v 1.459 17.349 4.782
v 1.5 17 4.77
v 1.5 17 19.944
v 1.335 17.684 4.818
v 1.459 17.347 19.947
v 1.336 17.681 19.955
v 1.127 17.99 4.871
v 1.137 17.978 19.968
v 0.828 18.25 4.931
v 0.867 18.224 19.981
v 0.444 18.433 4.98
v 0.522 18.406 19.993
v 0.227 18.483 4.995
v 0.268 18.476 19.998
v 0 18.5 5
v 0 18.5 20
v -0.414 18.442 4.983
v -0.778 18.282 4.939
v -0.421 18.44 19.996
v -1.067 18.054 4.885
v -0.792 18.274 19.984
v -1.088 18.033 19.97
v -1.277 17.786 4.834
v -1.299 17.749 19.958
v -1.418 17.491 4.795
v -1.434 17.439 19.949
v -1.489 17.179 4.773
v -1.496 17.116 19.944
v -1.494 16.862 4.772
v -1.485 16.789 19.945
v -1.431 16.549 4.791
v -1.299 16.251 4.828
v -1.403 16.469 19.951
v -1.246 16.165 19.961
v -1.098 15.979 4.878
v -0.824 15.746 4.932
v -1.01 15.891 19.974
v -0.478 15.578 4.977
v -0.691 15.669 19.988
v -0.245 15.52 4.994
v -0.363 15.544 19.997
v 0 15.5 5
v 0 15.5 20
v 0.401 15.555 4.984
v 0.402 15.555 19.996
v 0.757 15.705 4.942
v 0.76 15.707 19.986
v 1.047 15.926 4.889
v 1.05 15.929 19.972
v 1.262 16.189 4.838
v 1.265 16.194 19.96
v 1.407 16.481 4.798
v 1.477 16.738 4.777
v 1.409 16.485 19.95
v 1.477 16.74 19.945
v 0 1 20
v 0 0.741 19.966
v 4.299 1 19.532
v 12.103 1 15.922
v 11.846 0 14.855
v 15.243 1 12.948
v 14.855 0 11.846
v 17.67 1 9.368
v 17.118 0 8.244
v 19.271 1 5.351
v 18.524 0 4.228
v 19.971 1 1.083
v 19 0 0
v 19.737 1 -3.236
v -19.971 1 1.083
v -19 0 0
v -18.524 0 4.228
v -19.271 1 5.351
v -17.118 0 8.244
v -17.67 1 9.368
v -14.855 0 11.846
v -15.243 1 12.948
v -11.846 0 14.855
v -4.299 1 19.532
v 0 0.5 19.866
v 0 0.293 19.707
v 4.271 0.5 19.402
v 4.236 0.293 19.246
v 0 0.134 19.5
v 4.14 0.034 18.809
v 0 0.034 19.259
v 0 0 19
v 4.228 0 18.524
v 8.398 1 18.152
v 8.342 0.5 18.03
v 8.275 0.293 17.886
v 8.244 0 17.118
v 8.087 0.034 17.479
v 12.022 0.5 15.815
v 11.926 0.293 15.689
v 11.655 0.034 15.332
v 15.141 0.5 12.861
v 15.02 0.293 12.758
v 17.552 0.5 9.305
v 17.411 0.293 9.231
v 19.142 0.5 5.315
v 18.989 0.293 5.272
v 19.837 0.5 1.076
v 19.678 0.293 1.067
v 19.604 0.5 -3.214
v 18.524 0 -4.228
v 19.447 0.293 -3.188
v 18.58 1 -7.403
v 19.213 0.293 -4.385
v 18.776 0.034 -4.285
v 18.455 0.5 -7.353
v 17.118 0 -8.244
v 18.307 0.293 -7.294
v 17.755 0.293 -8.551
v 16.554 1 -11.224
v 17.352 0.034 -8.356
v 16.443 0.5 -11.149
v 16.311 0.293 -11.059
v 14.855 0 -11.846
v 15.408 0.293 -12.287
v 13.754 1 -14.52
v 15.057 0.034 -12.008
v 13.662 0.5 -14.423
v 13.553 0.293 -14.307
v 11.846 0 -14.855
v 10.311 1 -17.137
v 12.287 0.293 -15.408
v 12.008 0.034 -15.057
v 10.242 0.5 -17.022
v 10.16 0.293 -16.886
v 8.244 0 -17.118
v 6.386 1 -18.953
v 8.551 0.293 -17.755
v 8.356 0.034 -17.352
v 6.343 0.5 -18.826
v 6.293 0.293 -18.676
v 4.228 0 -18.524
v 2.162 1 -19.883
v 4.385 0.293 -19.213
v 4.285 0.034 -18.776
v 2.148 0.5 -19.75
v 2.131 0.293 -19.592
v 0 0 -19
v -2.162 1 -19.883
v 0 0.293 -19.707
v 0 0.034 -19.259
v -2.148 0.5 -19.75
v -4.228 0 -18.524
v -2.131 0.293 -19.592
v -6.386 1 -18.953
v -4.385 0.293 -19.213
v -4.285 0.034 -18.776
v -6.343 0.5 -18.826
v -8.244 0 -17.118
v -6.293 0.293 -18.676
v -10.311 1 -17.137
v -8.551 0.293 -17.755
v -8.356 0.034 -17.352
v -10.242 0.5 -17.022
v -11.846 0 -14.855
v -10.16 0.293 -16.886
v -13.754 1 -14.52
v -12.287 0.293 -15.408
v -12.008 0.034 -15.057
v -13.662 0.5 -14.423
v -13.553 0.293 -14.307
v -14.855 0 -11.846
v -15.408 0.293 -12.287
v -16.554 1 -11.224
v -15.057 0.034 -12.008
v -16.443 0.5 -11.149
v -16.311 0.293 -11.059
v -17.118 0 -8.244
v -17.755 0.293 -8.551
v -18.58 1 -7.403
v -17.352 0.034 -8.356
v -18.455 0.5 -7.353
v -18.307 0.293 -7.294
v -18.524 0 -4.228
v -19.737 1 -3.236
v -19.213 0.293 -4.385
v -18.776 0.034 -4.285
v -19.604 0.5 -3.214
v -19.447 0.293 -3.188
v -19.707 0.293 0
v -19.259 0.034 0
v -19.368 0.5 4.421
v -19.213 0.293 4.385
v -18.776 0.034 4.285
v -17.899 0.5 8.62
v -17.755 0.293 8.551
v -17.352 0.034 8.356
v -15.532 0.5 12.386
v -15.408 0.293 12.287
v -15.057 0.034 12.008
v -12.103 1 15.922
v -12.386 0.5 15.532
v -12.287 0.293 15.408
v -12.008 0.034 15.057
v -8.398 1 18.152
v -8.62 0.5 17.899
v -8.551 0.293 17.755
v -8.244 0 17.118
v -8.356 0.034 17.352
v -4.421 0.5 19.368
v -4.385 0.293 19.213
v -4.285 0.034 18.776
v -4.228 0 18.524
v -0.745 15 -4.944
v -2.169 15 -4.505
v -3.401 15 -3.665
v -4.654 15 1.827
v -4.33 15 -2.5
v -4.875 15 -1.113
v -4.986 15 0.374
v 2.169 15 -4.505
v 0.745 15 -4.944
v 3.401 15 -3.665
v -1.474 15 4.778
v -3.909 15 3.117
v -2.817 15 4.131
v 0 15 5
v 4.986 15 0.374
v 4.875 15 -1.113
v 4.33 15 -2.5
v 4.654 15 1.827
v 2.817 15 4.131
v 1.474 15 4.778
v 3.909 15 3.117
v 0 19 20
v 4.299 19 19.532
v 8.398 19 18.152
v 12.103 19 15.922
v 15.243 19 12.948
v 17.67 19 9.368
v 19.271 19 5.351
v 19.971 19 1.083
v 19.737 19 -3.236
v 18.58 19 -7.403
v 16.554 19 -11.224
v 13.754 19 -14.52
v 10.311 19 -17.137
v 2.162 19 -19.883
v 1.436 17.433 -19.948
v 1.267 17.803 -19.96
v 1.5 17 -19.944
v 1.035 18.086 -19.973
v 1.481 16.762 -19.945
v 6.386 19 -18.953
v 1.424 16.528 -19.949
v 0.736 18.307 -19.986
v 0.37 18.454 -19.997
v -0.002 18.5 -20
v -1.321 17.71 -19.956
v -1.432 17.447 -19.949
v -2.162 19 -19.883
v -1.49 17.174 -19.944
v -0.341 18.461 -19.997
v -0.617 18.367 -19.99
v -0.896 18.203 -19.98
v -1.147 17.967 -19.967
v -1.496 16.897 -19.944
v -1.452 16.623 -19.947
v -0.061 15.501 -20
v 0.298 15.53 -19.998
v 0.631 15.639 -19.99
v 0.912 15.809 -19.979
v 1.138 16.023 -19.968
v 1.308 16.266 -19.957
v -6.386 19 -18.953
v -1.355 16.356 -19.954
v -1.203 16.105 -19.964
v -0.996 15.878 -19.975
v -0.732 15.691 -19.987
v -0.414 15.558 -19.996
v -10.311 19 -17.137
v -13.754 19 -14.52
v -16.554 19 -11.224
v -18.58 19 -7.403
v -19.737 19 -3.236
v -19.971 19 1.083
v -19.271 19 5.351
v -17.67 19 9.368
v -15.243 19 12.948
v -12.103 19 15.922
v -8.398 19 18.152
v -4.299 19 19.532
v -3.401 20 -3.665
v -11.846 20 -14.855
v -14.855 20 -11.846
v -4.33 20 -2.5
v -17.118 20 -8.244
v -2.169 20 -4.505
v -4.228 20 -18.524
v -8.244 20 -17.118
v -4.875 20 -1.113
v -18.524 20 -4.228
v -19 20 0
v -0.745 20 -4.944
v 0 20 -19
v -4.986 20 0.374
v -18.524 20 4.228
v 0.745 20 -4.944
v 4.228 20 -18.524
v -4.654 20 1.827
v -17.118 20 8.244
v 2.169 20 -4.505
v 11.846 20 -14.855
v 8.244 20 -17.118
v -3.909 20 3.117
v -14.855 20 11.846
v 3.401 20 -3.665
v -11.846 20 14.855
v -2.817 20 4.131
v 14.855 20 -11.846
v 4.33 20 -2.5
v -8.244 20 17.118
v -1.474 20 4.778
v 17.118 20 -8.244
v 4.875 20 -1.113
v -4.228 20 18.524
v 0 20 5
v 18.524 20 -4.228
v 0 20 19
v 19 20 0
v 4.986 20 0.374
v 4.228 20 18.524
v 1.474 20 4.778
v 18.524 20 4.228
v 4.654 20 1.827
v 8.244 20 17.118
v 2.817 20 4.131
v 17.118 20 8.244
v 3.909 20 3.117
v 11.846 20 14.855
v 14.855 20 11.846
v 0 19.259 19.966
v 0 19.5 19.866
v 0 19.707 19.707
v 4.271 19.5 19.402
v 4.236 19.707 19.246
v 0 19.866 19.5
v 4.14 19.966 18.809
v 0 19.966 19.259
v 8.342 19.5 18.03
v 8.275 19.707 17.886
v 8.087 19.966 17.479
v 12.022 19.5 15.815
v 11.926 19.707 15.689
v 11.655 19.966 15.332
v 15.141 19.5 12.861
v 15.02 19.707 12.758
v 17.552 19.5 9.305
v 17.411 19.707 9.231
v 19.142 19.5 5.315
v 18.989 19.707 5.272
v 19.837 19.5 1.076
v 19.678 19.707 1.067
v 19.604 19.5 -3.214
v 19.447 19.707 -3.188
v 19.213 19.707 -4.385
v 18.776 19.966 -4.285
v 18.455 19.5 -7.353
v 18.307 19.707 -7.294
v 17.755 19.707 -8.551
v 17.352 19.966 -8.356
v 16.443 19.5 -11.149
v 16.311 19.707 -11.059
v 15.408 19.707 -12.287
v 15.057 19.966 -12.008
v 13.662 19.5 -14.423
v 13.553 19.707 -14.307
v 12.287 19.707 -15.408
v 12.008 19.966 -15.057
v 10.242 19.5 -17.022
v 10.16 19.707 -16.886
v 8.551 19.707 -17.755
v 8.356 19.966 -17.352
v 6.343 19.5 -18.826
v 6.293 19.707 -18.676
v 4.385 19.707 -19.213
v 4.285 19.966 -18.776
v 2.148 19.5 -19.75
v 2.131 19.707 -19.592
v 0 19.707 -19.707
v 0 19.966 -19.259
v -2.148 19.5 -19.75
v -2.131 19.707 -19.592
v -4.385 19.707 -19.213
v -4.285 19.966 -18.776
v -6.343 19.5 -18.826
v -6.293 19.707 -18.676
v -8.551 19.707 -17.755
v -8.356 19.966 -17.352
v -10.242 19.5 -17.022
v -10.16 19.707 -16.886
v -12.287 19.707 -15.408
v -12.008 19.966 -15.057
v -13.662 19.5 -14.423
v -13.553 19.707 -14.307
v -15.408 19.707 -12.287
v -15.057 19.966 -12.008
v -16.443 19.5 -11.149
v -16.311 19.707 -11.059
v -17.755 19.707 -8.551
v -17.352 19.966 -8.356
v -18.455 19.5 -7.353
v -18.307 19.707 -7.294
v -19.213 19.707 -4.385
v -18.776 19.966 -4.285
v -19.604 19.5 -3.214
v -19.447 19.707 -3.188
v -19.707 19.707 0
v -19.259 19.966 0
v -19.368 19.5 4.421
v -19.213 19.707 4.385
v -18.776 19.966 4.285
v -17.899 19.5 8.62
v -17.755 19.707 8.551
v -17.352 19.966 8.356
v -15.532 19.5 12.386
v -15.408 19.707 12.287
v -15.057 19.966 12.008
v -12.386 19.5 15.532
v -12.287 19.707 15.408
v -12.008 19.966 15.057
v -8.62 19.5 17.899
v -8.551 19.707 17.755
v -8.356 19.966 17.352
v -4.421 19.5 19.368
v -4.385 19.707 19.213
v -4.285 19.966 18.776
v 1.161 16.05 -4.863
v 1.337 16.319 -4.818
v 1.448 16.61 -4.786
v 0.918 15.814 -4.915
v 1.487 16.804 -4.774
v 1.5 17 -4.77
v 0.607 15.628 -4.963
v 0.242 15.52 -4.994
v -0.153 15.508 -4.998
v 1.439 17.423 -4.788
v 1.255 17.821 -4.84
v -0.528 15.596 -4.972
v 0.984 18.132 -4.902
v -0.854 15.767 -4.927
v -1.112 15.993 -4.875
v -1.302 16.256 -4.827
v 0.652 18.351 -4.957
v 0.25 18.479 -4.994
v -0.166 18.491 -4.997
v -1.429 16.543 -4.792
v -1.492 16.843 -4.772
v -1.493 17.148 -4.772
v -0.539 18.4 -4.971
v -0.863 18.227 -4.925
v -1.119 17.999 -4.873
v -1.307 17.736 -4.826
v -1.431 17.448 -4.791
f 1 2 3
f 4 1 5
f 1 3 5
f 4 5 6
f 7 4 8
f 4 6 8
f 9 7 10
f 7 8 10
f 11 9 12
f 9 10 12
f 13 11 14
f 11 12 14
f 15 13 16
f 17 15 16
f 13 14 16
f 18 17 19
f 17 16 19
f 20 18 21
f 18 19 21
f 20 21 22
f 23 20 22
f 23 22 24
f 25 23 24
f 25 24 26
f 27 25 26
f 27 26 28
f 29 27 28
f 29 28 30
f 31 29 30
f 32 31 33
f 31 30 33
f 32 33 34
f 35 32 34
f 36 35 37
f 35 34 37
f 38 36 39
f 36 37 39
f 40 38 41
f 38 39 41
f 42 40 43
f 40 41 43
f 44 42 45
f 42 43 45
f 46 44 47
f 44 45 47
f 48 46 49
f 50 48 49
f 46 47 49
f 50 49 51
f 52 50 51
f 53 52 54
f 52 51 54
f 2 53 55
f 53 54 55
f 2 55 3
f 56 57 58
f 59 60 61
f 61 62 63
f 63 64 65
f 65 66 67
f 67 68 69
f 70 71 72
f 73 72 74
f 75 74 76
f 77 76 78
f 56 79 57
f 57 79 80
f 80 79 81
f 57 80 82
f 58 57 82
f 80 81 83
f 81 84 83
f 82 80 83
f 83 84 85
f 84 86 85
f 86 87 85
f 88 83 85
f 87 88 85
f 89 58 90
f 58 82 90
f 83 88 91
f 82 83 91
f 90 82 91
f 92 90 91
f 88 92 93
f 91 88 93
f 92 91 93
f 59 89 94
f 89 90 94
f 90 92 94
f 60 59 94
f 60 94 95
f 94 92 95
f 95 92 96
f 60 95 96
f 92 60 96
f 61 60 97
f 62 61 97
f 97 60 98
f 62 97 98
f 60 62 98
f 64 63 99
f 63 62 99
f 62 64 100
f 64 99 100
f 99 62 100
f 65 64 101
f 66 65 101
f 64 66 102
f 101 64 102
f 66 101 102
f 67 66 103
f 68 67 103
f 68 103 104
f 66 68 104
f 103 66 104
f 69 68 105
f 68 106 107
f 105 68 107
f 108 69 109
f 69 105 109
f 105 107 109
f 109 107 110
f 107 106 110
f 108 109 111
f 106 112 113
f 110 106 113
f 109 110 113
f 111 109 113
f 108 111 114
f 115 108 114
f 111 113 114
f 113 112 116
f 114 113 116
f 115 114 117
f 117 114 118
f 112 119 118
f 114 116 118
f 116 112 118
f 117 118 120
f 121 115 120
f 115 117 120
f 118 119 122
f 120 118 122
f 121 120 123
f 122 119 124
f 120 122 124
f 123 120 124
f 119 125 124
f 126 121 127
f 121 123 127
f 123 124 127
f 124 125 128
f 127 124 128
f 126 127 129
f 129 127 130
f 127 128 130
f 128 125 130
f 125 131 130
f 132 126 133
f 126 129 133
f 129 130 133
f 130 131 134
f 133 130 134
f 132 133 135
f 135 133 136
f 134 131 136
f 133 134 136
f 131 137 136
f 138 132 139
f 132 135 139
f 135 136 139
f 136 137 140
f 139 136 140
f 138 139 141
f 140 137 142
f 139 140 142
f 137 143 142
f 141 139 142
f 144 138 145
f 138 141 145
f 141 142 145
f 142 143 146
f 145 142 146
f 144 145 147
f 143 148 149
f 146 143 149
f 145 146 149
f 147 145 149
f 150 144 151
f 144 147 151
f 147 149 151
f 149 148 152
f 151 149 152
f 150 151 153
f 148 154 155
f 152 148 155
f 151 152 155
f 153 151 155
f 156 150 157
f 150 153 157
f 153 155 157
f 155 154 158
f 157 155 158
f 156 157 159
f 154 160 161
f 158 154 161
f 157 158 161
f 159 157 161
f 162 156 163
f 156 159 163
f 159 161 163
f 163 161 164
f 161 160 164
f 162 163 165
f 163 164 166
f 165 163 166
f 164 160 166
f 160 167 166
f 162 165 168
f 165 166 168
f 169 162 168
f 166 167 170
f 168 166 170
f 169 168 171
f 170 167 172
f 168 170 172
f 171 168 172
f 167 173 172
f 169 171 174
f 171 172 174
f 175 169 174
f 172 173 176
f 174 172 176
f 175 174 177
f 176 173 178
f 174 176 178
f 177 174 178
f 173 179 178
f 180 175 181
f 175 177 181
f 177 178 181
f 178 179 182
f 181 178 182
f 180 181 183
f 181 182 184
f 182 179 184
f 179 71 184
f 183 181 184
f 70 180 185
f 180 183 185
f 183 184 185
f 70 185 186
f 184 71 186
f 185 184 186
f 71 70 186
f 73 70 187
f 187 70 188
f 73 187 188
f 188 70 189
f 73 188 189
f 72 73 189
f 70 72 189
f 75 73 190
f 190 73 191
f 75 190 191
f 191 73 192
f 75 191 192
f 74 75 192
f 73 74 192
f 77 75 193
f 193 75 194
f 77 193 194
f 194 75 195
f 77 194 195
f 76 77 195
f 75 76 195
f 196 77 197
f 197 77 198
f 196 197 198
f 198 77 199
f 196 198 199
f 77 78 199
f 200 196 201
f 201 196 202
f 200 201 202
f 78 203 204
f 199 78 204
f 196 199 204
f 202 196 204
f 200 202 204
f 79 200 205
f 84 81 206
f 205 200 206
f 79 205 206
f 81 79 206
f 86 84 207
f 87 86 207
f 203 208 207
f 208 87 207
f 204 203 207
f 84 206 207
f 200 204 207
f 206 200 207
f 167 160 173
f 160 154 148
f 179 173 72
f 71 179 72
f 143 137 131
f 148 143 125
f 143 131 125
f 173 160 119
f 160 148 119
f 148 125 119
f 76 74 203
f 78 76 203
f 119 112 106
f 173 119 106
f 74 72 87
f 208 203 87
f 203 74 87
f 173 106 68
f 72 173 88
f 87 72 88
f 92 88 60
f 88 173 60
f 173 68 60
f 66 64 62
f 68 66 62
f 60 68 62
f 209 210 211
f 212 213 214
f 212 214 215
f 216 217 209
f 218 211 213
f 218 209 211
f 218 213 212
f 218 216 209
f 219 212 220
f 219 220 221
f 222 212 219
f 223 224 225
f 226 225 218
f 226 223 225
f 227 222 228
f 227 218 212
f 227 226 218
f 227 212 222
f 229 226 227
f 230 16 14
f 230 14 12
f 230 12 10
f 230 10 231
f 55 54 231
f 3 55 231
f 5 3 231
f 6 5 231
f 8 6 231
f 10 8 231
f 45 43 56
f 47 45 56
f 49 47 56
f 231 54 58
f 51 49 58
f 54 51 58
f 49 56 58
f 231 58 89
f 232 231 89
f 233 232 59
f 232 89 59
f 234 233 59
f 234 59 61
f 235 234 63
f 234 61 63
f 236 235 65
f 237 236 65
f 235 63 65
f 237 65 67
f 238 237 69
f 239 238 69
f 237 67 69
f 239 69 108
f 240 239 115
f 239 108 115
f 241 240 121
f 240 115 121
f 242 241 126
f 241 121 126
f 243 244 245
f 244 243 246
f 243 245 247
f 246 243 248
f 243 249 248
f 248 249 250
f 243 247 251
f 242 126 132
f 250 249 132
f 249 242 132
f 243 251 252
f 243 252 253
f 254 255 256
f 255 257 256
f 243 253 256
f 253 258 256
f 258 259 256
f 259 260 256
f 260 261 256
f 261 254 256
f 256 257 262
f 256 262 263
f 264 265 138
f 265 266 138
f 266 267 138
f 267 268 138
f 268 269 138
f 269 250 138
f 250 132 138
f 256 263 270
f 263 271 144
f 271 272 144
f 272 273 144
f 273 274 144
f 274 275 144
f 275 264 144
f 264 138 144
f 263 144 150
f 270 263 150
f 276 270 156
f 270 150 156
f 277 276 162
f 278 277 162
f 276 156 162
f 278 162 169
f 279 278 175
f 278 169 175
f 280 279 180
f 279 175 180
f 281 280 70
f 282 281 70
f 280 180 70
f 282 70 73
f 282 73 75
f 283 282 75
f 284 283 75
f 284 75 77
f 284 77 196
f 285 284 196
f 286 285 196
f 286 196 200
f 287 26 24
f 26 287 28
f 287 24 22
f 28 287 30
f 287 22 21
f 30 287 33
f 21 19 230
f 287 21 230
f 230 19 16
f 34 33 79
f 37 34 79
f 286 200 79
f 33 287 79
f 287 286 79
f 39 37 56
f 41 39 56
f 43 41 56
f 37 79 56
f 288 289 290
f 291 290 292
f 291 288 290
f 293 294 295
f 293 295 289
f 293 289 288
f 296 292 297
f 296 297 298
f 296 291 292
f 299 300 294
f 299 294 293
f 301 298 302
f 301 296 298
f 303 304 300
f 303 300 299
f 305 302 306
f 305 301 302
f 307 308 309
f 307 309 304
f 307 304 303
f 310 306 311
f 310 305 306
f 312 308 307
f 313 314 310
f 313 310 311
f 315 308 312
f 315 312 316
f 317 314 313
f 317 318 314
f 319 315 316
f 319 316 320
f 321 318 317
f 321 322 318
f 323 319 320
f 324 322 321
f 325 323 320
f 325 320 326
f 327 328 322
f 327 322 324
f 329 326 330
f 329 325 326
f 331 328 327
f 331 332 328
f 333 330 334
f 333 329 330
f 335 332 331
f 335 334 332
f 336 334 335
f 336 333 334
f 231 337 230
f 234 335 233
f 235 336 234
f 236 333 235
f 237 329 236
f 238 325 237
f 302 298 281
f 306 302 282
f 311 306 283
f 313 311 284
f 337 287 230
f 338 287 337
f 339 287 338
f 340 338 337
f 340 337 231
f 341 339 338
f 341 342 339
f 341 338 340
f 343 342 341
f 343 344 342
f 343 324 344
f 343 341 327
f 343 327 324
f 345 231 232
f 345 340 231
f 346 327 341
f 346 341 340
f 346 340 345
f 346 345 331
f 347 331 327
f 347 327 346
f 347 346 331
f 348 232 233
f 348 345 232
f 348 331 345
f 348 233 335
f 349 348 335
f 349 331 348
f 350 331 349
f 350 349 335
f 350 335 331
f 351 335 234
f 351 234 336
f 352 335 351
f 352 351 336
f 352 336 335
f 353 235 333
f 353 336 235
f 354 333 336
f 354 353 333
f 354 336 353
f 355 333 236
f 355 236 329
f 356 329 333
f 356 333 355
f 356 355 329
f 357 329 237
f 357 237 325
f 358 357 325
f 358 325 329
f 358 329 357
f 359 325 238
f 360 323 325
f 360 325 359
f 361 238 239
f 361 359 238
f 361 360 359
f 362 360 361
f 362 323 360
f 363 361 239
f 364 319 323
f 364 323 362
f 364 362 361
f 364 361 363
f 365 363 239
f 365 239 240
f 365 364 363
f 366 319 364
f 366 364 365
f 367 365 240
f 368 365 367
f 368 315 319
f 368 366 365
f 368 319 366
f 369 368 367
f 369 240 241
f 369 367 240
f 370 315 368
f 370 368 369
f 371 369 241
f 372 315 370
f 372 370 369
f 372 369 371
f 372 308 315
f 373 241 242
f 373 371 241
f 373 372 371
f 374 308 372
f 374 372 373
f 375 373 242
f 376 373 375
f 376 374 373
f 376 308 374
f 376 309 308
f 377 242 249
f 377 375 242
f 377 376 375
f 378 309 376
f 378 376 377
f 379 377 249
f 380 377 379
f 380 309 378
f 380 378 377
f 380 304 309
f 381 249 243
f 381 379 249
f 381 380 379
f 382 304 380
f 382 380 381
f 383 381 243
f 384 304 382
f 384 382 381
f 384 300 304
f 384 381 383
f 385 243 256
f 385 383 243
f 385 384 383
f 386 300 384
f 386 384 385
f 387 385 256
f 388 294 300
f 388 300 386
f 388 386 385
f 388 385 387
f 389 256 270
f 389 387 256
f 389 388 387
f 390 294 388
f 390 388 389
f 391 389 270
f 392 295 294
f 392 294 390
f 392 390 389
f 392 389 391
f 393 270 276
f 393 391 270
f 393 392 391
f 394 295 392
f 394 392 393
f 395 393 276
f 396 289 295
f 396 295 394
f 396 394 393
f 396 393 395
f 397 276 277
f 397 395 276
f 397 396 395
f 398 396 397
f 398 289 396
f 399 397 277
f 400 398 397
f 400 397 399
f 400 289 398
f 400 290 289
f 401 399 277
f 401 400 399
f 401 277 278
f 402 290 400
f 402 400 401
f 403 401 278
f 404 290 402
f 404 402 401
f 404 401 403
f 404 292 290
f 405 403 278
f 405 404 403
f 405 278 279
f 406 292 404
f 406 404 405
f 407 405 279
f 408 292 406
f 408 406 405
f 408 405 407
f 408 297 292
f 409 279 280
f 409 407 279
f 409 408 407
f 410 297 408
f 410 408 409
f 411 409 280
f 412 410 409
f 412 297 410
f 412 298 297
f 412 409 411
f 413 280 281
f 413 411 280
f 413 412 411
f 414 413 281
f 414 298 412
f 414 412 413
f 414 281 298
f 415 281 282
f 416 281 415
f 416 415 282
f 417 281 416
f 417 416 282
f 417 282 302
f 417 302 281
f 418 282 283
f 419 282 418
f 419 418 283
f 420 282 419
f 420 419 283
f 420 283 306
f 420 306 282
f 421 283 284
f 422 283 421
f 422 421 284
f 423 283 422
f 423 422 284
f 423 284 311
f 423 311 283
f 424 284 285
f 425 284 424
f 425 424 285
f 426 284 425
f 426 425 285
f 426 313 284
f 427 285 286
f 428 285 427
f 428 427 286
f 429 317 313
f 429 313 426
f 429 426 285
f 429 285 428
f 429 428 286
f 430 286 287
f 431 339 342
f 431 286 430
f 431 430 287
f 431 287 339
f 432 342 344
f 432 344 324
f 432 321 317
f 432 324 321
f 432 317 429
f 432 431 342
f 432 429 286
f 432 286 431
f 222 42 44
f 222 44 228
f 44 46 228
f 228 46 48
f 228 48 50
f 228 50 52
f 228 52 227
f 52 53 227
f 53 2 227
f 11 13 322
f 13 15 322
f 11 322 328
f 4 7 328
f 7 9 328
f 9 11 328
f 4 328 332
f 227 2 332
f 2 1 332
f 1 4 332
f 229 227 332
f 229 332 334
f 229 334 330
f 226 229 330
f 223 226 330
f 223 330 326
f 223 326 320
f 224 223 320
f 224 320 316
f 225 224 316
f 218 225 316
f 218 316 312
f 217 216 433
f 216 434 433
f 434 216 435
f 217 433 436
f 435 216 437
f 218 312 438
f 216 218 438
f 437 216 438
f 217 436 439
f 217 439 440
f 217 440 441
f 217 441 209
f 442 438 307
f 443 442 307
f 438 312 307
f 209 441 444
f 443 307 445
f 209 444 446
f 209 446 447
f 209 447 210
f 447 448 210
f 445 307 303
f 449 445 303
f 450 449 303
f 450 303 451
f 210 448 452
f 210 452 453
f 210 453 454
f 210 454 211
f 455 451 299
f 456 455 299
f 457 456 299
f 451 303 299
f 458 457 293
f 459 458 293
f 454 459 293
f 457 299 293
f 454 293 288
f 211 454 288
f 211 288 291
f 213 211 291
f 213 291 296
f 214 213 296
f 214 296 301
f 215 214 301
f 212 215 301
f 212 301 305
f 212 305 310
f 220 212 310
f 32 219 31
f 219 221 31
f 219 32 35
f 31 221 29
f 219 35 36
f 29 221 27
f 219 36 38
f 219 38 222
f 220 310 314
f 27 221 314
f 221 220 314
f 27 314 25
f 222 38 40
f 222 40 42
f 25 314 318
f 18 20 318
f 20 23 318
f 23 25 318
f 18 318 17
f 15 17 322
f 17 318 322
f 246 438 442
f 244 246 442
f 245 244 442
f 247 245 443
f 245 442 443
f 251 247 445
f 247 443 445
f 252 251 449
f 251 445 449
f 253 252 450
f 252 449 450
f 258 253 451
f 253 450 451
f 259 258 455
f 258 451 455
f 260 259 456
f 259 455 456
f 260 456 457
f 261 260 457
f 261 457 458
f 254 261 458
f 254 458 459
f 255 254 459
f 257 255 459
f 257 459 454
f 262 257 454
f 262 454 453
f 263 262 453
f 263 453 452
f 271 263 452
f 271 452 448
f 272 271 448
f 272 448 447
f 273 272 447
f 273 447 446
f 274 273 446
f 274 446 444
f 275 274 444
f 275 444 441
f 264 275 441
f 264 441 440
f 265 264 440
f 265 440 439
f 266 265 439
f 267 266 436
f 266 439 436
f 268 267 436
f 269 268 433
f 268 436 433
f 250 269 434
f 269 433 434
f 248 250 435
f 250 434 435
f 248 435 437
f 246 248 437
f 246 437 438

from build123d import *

# Parameters (mm, degrees)
SKETCH1_R           = 20
BOSS_EXTRUDE1_DEPTH = 20
SKETCH2_R           = 5
CUT_EXTRUDE1_DEPTH  = 5
SKETCH3_R           = 1.5
CUT_EXTRUDE2_DEPTH  = 49.989794856
FILLET1_R           = 1
FILLET2_R           = 1


with BuildPart() as part:
    # Sketch1 → Boss-Extrude1 (new body)
    with BuildSketch(Plane(origin=(0, 0, 0), x_dir=(1, 0, 0), z_dir=(0, 1, 0))):
        with Locations(Location((0, 0, 0), (0, 0, 270))):
            Circle(SKETCH1_R)
    extrude(amount=BOSS_EXTRUDE1_DEPTH)

    # Sketch2 → Cut-Extrude1 (cut)
    with BuildSketch(Plane(origin=(0, 20, 0), x_dir=(1, 0, 0), z_dir=(0, 1, 0))):
        with Locations(Location((0, 0, 0), (0, 0, 270))):
            Circle(SKETCH2_R)
    extrude(amount=-CUT_EXTRUDE1_DEPTH, mode=Mode.SUBTRACT)

    # Sketch3 → Cut-Extrude2 (cut, through all)
    with BuildSketch(Plane.XY.offset(20)):
        with Locations((0, 17)):
            Circle(SKETCH3_R)
    extrude(amount=-CUT_EXTRUDE2_DEPTH, mode=Mode.SUBTRACT)

    # Fillet1
    fillet1_edges = [part.edges().sort_by_distance(p)[0] for p in [
        (0, 0, -20),
    ]]
    fillet(fillet1_edges, radius=FILLET1_R)

    # Fillet2
    fillet2_edges = [part.edges().sort_by_distance(p)[0] for p in [
        (0, 20, -20),
    ]]
    fillet(fillet2_edges, radius=FILLET2_R)


solid = part.part
